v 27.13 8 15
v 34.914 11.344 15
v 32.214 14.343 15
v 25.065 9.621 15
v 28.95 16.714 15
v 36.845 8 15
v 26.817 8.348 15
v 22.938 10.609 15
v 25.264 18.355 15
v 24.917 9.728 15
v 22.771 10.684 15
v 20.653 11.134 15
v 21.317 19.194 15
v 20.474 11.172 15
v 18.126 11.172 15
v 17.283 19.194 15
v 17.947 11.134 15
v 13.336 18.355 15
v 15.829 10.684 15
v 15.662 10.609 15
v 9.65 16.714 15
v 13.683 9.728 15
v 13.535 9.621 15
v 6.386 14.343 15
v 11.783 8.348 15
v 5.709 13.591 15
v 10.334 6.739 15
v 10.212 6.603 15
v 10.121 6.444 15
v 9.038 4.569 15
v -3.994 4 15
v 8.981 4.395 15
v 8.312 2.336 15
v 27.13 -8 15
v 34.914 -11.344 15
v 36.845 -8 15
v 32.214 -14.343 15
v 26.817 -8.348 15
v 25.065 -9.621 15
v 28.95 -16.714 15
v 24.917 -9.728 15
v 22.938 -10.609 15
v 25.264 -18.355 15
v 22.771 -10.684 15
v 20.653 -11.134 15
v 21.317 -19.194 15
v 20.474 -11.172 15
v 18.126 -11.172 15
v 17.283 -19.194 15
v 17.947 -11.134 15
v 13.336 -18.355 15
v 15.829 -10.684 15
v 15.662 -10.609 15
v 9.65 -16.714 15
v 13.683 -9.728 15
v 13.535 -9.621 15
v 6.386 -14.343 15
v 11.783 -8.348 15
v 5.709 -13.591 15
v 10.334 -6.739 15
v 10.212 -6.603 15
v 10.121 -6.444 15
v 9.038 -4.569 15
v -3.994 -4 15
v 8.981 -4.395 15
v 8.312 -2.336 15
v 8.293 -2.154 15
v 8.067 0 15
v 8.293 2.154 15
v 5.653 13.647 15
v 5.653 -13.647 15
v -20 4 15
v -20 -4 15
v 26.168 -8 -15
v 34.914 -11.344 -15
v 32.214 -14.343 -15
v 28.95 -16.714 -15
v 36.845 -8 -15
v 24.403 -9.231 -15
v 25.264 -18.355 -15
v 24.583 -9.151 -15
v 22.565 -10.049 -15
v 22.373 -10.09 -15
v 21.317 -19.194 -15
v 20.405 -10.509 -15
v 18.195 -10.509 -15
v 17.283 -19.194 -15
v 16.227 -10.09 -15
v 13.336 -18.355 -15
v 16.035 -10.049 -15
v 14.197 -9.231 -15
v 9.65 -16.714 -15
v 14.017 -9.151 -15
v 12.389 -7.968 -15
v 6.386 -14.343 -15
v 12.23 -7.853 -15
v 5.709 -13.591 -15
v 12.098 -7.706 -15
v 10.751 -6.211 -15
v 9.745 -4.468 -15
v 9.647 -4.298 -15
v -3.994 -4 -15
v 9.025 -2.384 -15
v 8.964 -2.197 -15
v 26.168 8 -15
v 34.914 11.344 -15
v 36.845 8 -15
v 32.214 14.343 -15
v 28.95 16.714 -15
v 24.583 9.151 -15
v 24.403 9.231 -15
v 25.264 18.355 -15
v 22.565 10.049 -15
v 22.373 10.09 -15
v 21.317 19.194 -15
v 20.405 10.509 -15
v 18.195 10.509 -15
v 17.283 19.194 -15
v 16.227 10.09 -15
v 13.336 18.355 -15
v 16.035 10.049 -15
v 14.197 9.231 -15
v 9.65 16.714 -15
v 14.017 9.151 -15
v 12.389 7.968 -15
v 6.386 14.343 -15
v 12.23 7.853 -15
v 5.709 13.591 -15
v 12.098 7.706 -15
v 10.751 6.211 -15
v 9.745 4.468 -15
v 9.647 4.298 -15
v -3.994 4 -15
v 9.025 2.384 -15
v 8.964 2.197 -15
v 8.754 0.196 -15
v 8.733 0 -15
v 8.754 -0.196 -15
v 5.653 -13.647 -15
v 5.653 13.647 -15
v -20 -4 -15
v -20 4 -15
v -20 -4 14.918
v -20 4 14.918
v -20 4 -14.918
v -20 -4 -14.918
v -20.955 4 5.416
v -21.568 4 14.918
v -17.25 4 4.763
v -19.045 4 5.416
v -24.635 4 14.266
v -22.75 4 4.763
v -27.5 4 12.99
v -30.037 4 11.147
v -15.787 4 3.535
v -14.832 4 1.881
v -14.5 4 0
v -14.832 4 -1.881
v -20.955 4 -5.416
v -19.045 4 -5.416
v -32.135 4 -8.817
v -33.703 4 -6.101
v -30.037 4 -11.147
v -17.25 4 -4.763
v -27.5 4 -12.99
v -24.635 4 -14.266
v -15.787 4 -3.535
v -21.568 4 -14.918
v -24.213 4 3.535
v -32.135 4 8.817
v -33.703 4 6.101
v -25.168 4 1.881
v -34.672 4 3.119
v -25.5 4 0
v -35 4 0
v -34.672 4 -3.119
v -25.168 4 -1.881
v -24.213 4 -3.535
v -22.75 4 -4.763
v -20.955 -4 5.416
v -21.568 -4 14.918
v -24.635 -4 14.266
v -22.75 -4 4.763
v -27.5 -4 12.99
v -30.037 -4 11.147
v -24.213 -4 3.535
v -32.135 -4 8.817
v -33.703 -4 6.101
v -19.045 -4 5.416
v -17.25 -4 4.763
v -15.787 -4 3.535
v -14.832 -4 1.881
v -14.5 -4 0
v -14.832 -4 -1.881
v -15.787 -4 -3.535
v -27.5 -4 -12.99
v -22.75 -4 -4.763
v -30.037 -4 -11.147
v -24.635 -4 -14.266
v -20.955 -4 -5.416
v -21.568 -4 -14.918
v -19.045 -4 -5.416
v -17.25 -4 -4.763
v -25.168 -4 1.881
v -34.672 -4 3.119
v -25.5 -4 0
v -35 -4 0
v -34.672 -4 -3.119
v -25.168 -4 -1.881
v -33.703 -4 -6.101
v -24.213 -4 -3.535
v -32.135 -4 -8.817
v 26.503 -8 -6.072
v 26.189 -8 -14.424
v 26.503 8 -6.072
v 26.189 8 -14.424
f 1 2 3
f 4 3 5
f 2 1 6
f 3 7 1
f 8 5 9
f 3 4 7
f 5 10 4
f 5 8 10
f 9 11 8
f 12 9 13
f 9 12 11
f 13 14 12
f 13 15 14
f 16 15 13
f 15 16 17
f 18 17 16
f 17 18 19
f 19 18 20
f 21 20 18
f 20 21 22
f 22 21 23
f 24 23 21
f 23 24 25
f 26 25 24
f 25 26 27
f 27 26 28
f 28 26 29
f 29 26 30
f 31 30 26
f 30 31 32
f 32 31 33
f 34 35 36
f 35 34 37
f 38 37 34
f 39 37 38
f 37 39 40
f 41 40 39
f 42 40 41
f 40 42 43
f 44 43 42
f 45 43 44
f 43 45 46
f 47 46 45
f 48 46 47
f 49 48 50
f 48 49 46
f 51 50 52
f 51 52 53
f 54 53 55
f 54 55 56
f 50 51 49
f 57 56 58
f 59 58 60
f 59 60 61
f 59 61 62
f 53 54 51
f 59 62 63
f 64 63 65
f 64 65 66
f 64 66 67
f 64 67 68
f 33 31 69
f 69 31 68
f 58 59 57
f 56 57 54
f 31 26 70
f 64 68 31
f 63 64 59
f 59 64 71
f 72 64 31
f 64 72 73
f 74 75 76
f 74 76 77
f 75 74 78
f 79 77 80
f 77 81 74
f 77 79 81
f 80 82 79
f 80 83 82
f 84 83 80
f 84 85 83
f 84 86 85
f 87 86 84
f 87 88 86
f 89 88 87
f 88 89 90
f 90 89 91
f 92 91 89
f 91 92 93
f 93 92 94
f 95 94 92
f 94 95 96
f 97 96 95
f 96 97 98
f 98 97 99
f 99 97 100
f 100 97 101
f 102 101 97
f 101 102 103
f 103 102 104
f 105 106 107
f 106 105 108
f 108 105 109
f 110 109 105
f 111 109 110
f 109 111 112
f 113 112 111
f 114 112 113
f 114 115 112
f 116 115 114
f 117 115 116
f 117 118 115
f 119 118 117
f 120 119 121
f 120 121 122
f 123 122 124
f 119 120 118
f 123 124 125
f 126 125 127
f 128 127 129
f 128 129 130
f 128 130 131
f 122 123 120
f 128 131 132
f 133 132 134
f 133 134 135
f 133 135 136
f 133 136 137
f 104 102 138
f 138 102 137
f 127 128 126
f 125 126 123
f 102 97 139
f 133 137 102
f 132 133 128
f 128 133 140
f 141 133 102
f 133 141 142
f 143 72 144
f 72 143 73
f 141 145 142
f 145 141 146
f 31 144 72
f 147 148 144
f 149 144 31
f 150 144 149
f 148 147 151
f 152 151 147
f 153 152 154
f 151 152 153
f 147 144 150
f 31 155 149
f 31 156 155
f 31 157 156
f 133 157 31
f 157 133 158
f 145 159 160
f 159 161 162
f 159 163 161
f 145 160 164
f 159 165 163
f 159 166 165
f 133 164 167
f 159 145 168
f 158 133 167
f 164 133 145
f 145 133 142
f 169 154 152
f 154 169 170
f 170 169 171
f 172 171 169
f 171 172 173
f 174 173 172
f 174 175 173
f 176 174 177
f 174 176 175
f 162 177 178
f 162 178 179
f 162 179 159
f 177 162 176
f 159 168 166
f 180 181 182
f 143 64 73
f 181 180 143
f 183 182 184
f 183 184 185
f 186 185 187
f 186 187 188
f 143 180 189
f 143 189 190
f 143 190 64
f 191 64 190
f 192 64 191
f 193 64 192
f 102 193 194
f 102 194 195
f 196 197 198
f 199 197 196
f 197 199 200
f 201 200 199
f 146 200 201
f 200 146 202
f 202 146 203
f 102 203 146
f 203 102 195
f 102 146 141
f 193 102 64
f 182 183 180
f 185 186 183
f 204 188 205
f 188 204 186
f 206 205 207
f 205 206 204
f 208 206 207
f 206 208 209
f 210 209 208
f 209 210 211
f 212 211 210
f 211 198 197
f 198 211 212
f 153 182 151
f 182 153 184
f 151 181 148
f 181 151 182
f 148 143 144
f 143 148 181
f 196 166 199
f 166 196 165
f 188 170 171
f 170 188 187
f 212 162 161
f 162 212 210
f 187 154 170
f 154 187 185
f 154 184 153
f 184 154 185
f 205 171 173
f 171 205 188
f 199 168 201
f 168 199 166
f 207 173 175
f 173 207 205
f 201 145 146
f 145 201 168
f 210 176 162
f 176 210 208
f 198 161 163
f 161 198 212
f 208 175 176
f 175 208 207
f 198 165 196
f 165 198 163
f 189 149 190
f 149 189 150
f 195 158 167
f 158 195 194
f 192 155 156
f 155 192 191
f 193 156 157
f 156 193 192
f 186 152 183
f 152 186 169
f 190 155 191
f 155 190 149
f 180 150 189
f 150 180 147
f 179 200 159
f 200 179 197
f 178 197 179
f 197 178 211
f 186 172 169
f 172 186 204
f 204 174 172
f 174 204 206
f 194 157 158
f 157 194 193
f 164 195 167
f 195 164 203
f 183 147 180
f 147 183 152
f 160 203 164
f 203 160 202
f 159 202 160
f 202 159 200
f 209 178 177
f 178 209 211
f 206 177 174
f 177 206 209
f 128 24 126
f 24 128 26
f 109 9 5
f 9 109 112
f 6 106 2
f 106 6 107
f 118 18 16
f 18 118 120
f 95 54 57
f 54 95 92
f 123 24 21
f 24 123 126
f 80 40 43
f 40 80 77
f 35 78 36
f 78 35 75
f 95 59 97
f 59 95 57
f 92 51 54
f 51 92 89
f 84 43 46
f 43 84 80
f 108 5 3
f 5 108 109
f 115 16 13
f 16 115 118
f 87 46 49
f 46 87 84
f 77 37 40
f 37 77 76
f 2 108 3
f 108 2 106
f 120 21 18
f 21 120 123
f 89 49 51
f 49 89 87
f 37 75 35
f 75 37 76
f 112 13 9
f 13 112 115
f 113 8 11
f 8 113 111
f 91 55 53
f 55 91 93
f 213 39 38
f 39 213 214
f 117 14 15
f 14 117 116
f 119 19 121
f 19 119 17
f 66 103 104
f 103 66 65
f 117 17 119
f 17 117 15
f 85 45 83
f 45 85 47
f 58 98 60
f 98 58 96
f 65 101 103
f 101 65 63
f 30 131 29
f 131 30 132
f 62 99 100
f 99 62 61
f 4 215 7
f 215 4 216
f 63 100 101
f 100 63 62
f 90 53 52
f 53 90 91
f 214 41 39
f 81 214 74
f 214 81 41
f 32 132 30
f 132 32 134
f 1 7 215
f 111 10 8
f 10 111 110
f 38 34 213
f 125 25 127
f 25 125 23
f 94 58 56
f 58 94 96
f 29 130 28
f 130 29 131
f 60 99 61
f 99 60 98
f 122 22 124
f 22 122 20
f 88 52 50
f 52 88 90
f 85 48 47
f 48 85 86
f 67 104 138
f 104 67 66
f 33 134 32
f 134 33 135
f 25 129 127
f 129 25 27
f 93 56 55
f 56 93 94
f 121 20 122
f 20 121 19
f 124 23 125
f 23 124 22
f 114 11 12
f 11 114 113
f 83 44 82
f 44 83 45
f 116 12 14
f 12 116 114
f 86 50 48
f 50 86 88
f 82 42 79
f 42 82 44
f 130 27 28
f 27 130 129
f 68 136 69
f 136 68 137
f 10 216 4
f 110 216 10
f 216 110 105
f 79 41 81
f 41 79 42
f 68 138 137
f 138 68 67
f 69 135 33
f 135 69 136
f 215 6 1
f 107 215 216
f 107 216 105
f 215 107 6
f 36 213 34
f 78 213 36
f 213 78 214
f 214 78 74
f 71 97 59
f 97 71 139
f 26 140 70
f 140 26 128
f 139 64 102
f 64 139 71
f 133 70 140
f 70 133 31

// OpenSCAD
H=30;
CYL_BORDER=8;
HOLE_R1=21/2;
HOLE_R2=22.6/2;
SLIT=16;
ARM_L=20;
ARM_HOLE_R=11/2;
OFFSET=1.2;

ARM_W=CYL_BORDER;
CYL_R=max(HOLE_R1, HOLE_R2) + CYL_BORDER;

module hole() {
	cylinder(r1=HOLE_R1, r2=HOLE_R2,
			h=H*OFFSET, center=true);
}

module handle() {
	union() {
		difference() {
			cylinder(r1=CYL_R, r2=CYL_R, h=H, center=true);
			hole();
			translate([CYL_R/2, 0, 0])
			cube([CYL_R*1.5, SLIT, H*OFFSET], center=true);
		}
		difference() {
			translate([0, 0, -H/2])
			rotate([0, 0, 90+45])
			cube([CYL_R, CYL_R, H], center=false);
			hole();
		}
	}
}

module arm() {
	difference(){
		union(){
			translate([-ARM_L, -ARM_W/2, -H/2])
			cube([ARM_L, ARM_W, H]);
			rotate([90, 0, 0])
			translate([-ARM_L, 0, 0])
			cylinder(r=H/2, h=ARM_W, center=true);
		}
		/* Hole to hold the arm */
		translate([-ARM_L, 0, 0])
		rotate([90, 0, 0])
		cylinder(r=ARM_HOLE_R, h=ARM_W*OFFSET, center=true);
	}
}

module main() {
	union(){
		arm();
		translate([CYL_R, 0, 0])
		handle();
	}
}

main();
